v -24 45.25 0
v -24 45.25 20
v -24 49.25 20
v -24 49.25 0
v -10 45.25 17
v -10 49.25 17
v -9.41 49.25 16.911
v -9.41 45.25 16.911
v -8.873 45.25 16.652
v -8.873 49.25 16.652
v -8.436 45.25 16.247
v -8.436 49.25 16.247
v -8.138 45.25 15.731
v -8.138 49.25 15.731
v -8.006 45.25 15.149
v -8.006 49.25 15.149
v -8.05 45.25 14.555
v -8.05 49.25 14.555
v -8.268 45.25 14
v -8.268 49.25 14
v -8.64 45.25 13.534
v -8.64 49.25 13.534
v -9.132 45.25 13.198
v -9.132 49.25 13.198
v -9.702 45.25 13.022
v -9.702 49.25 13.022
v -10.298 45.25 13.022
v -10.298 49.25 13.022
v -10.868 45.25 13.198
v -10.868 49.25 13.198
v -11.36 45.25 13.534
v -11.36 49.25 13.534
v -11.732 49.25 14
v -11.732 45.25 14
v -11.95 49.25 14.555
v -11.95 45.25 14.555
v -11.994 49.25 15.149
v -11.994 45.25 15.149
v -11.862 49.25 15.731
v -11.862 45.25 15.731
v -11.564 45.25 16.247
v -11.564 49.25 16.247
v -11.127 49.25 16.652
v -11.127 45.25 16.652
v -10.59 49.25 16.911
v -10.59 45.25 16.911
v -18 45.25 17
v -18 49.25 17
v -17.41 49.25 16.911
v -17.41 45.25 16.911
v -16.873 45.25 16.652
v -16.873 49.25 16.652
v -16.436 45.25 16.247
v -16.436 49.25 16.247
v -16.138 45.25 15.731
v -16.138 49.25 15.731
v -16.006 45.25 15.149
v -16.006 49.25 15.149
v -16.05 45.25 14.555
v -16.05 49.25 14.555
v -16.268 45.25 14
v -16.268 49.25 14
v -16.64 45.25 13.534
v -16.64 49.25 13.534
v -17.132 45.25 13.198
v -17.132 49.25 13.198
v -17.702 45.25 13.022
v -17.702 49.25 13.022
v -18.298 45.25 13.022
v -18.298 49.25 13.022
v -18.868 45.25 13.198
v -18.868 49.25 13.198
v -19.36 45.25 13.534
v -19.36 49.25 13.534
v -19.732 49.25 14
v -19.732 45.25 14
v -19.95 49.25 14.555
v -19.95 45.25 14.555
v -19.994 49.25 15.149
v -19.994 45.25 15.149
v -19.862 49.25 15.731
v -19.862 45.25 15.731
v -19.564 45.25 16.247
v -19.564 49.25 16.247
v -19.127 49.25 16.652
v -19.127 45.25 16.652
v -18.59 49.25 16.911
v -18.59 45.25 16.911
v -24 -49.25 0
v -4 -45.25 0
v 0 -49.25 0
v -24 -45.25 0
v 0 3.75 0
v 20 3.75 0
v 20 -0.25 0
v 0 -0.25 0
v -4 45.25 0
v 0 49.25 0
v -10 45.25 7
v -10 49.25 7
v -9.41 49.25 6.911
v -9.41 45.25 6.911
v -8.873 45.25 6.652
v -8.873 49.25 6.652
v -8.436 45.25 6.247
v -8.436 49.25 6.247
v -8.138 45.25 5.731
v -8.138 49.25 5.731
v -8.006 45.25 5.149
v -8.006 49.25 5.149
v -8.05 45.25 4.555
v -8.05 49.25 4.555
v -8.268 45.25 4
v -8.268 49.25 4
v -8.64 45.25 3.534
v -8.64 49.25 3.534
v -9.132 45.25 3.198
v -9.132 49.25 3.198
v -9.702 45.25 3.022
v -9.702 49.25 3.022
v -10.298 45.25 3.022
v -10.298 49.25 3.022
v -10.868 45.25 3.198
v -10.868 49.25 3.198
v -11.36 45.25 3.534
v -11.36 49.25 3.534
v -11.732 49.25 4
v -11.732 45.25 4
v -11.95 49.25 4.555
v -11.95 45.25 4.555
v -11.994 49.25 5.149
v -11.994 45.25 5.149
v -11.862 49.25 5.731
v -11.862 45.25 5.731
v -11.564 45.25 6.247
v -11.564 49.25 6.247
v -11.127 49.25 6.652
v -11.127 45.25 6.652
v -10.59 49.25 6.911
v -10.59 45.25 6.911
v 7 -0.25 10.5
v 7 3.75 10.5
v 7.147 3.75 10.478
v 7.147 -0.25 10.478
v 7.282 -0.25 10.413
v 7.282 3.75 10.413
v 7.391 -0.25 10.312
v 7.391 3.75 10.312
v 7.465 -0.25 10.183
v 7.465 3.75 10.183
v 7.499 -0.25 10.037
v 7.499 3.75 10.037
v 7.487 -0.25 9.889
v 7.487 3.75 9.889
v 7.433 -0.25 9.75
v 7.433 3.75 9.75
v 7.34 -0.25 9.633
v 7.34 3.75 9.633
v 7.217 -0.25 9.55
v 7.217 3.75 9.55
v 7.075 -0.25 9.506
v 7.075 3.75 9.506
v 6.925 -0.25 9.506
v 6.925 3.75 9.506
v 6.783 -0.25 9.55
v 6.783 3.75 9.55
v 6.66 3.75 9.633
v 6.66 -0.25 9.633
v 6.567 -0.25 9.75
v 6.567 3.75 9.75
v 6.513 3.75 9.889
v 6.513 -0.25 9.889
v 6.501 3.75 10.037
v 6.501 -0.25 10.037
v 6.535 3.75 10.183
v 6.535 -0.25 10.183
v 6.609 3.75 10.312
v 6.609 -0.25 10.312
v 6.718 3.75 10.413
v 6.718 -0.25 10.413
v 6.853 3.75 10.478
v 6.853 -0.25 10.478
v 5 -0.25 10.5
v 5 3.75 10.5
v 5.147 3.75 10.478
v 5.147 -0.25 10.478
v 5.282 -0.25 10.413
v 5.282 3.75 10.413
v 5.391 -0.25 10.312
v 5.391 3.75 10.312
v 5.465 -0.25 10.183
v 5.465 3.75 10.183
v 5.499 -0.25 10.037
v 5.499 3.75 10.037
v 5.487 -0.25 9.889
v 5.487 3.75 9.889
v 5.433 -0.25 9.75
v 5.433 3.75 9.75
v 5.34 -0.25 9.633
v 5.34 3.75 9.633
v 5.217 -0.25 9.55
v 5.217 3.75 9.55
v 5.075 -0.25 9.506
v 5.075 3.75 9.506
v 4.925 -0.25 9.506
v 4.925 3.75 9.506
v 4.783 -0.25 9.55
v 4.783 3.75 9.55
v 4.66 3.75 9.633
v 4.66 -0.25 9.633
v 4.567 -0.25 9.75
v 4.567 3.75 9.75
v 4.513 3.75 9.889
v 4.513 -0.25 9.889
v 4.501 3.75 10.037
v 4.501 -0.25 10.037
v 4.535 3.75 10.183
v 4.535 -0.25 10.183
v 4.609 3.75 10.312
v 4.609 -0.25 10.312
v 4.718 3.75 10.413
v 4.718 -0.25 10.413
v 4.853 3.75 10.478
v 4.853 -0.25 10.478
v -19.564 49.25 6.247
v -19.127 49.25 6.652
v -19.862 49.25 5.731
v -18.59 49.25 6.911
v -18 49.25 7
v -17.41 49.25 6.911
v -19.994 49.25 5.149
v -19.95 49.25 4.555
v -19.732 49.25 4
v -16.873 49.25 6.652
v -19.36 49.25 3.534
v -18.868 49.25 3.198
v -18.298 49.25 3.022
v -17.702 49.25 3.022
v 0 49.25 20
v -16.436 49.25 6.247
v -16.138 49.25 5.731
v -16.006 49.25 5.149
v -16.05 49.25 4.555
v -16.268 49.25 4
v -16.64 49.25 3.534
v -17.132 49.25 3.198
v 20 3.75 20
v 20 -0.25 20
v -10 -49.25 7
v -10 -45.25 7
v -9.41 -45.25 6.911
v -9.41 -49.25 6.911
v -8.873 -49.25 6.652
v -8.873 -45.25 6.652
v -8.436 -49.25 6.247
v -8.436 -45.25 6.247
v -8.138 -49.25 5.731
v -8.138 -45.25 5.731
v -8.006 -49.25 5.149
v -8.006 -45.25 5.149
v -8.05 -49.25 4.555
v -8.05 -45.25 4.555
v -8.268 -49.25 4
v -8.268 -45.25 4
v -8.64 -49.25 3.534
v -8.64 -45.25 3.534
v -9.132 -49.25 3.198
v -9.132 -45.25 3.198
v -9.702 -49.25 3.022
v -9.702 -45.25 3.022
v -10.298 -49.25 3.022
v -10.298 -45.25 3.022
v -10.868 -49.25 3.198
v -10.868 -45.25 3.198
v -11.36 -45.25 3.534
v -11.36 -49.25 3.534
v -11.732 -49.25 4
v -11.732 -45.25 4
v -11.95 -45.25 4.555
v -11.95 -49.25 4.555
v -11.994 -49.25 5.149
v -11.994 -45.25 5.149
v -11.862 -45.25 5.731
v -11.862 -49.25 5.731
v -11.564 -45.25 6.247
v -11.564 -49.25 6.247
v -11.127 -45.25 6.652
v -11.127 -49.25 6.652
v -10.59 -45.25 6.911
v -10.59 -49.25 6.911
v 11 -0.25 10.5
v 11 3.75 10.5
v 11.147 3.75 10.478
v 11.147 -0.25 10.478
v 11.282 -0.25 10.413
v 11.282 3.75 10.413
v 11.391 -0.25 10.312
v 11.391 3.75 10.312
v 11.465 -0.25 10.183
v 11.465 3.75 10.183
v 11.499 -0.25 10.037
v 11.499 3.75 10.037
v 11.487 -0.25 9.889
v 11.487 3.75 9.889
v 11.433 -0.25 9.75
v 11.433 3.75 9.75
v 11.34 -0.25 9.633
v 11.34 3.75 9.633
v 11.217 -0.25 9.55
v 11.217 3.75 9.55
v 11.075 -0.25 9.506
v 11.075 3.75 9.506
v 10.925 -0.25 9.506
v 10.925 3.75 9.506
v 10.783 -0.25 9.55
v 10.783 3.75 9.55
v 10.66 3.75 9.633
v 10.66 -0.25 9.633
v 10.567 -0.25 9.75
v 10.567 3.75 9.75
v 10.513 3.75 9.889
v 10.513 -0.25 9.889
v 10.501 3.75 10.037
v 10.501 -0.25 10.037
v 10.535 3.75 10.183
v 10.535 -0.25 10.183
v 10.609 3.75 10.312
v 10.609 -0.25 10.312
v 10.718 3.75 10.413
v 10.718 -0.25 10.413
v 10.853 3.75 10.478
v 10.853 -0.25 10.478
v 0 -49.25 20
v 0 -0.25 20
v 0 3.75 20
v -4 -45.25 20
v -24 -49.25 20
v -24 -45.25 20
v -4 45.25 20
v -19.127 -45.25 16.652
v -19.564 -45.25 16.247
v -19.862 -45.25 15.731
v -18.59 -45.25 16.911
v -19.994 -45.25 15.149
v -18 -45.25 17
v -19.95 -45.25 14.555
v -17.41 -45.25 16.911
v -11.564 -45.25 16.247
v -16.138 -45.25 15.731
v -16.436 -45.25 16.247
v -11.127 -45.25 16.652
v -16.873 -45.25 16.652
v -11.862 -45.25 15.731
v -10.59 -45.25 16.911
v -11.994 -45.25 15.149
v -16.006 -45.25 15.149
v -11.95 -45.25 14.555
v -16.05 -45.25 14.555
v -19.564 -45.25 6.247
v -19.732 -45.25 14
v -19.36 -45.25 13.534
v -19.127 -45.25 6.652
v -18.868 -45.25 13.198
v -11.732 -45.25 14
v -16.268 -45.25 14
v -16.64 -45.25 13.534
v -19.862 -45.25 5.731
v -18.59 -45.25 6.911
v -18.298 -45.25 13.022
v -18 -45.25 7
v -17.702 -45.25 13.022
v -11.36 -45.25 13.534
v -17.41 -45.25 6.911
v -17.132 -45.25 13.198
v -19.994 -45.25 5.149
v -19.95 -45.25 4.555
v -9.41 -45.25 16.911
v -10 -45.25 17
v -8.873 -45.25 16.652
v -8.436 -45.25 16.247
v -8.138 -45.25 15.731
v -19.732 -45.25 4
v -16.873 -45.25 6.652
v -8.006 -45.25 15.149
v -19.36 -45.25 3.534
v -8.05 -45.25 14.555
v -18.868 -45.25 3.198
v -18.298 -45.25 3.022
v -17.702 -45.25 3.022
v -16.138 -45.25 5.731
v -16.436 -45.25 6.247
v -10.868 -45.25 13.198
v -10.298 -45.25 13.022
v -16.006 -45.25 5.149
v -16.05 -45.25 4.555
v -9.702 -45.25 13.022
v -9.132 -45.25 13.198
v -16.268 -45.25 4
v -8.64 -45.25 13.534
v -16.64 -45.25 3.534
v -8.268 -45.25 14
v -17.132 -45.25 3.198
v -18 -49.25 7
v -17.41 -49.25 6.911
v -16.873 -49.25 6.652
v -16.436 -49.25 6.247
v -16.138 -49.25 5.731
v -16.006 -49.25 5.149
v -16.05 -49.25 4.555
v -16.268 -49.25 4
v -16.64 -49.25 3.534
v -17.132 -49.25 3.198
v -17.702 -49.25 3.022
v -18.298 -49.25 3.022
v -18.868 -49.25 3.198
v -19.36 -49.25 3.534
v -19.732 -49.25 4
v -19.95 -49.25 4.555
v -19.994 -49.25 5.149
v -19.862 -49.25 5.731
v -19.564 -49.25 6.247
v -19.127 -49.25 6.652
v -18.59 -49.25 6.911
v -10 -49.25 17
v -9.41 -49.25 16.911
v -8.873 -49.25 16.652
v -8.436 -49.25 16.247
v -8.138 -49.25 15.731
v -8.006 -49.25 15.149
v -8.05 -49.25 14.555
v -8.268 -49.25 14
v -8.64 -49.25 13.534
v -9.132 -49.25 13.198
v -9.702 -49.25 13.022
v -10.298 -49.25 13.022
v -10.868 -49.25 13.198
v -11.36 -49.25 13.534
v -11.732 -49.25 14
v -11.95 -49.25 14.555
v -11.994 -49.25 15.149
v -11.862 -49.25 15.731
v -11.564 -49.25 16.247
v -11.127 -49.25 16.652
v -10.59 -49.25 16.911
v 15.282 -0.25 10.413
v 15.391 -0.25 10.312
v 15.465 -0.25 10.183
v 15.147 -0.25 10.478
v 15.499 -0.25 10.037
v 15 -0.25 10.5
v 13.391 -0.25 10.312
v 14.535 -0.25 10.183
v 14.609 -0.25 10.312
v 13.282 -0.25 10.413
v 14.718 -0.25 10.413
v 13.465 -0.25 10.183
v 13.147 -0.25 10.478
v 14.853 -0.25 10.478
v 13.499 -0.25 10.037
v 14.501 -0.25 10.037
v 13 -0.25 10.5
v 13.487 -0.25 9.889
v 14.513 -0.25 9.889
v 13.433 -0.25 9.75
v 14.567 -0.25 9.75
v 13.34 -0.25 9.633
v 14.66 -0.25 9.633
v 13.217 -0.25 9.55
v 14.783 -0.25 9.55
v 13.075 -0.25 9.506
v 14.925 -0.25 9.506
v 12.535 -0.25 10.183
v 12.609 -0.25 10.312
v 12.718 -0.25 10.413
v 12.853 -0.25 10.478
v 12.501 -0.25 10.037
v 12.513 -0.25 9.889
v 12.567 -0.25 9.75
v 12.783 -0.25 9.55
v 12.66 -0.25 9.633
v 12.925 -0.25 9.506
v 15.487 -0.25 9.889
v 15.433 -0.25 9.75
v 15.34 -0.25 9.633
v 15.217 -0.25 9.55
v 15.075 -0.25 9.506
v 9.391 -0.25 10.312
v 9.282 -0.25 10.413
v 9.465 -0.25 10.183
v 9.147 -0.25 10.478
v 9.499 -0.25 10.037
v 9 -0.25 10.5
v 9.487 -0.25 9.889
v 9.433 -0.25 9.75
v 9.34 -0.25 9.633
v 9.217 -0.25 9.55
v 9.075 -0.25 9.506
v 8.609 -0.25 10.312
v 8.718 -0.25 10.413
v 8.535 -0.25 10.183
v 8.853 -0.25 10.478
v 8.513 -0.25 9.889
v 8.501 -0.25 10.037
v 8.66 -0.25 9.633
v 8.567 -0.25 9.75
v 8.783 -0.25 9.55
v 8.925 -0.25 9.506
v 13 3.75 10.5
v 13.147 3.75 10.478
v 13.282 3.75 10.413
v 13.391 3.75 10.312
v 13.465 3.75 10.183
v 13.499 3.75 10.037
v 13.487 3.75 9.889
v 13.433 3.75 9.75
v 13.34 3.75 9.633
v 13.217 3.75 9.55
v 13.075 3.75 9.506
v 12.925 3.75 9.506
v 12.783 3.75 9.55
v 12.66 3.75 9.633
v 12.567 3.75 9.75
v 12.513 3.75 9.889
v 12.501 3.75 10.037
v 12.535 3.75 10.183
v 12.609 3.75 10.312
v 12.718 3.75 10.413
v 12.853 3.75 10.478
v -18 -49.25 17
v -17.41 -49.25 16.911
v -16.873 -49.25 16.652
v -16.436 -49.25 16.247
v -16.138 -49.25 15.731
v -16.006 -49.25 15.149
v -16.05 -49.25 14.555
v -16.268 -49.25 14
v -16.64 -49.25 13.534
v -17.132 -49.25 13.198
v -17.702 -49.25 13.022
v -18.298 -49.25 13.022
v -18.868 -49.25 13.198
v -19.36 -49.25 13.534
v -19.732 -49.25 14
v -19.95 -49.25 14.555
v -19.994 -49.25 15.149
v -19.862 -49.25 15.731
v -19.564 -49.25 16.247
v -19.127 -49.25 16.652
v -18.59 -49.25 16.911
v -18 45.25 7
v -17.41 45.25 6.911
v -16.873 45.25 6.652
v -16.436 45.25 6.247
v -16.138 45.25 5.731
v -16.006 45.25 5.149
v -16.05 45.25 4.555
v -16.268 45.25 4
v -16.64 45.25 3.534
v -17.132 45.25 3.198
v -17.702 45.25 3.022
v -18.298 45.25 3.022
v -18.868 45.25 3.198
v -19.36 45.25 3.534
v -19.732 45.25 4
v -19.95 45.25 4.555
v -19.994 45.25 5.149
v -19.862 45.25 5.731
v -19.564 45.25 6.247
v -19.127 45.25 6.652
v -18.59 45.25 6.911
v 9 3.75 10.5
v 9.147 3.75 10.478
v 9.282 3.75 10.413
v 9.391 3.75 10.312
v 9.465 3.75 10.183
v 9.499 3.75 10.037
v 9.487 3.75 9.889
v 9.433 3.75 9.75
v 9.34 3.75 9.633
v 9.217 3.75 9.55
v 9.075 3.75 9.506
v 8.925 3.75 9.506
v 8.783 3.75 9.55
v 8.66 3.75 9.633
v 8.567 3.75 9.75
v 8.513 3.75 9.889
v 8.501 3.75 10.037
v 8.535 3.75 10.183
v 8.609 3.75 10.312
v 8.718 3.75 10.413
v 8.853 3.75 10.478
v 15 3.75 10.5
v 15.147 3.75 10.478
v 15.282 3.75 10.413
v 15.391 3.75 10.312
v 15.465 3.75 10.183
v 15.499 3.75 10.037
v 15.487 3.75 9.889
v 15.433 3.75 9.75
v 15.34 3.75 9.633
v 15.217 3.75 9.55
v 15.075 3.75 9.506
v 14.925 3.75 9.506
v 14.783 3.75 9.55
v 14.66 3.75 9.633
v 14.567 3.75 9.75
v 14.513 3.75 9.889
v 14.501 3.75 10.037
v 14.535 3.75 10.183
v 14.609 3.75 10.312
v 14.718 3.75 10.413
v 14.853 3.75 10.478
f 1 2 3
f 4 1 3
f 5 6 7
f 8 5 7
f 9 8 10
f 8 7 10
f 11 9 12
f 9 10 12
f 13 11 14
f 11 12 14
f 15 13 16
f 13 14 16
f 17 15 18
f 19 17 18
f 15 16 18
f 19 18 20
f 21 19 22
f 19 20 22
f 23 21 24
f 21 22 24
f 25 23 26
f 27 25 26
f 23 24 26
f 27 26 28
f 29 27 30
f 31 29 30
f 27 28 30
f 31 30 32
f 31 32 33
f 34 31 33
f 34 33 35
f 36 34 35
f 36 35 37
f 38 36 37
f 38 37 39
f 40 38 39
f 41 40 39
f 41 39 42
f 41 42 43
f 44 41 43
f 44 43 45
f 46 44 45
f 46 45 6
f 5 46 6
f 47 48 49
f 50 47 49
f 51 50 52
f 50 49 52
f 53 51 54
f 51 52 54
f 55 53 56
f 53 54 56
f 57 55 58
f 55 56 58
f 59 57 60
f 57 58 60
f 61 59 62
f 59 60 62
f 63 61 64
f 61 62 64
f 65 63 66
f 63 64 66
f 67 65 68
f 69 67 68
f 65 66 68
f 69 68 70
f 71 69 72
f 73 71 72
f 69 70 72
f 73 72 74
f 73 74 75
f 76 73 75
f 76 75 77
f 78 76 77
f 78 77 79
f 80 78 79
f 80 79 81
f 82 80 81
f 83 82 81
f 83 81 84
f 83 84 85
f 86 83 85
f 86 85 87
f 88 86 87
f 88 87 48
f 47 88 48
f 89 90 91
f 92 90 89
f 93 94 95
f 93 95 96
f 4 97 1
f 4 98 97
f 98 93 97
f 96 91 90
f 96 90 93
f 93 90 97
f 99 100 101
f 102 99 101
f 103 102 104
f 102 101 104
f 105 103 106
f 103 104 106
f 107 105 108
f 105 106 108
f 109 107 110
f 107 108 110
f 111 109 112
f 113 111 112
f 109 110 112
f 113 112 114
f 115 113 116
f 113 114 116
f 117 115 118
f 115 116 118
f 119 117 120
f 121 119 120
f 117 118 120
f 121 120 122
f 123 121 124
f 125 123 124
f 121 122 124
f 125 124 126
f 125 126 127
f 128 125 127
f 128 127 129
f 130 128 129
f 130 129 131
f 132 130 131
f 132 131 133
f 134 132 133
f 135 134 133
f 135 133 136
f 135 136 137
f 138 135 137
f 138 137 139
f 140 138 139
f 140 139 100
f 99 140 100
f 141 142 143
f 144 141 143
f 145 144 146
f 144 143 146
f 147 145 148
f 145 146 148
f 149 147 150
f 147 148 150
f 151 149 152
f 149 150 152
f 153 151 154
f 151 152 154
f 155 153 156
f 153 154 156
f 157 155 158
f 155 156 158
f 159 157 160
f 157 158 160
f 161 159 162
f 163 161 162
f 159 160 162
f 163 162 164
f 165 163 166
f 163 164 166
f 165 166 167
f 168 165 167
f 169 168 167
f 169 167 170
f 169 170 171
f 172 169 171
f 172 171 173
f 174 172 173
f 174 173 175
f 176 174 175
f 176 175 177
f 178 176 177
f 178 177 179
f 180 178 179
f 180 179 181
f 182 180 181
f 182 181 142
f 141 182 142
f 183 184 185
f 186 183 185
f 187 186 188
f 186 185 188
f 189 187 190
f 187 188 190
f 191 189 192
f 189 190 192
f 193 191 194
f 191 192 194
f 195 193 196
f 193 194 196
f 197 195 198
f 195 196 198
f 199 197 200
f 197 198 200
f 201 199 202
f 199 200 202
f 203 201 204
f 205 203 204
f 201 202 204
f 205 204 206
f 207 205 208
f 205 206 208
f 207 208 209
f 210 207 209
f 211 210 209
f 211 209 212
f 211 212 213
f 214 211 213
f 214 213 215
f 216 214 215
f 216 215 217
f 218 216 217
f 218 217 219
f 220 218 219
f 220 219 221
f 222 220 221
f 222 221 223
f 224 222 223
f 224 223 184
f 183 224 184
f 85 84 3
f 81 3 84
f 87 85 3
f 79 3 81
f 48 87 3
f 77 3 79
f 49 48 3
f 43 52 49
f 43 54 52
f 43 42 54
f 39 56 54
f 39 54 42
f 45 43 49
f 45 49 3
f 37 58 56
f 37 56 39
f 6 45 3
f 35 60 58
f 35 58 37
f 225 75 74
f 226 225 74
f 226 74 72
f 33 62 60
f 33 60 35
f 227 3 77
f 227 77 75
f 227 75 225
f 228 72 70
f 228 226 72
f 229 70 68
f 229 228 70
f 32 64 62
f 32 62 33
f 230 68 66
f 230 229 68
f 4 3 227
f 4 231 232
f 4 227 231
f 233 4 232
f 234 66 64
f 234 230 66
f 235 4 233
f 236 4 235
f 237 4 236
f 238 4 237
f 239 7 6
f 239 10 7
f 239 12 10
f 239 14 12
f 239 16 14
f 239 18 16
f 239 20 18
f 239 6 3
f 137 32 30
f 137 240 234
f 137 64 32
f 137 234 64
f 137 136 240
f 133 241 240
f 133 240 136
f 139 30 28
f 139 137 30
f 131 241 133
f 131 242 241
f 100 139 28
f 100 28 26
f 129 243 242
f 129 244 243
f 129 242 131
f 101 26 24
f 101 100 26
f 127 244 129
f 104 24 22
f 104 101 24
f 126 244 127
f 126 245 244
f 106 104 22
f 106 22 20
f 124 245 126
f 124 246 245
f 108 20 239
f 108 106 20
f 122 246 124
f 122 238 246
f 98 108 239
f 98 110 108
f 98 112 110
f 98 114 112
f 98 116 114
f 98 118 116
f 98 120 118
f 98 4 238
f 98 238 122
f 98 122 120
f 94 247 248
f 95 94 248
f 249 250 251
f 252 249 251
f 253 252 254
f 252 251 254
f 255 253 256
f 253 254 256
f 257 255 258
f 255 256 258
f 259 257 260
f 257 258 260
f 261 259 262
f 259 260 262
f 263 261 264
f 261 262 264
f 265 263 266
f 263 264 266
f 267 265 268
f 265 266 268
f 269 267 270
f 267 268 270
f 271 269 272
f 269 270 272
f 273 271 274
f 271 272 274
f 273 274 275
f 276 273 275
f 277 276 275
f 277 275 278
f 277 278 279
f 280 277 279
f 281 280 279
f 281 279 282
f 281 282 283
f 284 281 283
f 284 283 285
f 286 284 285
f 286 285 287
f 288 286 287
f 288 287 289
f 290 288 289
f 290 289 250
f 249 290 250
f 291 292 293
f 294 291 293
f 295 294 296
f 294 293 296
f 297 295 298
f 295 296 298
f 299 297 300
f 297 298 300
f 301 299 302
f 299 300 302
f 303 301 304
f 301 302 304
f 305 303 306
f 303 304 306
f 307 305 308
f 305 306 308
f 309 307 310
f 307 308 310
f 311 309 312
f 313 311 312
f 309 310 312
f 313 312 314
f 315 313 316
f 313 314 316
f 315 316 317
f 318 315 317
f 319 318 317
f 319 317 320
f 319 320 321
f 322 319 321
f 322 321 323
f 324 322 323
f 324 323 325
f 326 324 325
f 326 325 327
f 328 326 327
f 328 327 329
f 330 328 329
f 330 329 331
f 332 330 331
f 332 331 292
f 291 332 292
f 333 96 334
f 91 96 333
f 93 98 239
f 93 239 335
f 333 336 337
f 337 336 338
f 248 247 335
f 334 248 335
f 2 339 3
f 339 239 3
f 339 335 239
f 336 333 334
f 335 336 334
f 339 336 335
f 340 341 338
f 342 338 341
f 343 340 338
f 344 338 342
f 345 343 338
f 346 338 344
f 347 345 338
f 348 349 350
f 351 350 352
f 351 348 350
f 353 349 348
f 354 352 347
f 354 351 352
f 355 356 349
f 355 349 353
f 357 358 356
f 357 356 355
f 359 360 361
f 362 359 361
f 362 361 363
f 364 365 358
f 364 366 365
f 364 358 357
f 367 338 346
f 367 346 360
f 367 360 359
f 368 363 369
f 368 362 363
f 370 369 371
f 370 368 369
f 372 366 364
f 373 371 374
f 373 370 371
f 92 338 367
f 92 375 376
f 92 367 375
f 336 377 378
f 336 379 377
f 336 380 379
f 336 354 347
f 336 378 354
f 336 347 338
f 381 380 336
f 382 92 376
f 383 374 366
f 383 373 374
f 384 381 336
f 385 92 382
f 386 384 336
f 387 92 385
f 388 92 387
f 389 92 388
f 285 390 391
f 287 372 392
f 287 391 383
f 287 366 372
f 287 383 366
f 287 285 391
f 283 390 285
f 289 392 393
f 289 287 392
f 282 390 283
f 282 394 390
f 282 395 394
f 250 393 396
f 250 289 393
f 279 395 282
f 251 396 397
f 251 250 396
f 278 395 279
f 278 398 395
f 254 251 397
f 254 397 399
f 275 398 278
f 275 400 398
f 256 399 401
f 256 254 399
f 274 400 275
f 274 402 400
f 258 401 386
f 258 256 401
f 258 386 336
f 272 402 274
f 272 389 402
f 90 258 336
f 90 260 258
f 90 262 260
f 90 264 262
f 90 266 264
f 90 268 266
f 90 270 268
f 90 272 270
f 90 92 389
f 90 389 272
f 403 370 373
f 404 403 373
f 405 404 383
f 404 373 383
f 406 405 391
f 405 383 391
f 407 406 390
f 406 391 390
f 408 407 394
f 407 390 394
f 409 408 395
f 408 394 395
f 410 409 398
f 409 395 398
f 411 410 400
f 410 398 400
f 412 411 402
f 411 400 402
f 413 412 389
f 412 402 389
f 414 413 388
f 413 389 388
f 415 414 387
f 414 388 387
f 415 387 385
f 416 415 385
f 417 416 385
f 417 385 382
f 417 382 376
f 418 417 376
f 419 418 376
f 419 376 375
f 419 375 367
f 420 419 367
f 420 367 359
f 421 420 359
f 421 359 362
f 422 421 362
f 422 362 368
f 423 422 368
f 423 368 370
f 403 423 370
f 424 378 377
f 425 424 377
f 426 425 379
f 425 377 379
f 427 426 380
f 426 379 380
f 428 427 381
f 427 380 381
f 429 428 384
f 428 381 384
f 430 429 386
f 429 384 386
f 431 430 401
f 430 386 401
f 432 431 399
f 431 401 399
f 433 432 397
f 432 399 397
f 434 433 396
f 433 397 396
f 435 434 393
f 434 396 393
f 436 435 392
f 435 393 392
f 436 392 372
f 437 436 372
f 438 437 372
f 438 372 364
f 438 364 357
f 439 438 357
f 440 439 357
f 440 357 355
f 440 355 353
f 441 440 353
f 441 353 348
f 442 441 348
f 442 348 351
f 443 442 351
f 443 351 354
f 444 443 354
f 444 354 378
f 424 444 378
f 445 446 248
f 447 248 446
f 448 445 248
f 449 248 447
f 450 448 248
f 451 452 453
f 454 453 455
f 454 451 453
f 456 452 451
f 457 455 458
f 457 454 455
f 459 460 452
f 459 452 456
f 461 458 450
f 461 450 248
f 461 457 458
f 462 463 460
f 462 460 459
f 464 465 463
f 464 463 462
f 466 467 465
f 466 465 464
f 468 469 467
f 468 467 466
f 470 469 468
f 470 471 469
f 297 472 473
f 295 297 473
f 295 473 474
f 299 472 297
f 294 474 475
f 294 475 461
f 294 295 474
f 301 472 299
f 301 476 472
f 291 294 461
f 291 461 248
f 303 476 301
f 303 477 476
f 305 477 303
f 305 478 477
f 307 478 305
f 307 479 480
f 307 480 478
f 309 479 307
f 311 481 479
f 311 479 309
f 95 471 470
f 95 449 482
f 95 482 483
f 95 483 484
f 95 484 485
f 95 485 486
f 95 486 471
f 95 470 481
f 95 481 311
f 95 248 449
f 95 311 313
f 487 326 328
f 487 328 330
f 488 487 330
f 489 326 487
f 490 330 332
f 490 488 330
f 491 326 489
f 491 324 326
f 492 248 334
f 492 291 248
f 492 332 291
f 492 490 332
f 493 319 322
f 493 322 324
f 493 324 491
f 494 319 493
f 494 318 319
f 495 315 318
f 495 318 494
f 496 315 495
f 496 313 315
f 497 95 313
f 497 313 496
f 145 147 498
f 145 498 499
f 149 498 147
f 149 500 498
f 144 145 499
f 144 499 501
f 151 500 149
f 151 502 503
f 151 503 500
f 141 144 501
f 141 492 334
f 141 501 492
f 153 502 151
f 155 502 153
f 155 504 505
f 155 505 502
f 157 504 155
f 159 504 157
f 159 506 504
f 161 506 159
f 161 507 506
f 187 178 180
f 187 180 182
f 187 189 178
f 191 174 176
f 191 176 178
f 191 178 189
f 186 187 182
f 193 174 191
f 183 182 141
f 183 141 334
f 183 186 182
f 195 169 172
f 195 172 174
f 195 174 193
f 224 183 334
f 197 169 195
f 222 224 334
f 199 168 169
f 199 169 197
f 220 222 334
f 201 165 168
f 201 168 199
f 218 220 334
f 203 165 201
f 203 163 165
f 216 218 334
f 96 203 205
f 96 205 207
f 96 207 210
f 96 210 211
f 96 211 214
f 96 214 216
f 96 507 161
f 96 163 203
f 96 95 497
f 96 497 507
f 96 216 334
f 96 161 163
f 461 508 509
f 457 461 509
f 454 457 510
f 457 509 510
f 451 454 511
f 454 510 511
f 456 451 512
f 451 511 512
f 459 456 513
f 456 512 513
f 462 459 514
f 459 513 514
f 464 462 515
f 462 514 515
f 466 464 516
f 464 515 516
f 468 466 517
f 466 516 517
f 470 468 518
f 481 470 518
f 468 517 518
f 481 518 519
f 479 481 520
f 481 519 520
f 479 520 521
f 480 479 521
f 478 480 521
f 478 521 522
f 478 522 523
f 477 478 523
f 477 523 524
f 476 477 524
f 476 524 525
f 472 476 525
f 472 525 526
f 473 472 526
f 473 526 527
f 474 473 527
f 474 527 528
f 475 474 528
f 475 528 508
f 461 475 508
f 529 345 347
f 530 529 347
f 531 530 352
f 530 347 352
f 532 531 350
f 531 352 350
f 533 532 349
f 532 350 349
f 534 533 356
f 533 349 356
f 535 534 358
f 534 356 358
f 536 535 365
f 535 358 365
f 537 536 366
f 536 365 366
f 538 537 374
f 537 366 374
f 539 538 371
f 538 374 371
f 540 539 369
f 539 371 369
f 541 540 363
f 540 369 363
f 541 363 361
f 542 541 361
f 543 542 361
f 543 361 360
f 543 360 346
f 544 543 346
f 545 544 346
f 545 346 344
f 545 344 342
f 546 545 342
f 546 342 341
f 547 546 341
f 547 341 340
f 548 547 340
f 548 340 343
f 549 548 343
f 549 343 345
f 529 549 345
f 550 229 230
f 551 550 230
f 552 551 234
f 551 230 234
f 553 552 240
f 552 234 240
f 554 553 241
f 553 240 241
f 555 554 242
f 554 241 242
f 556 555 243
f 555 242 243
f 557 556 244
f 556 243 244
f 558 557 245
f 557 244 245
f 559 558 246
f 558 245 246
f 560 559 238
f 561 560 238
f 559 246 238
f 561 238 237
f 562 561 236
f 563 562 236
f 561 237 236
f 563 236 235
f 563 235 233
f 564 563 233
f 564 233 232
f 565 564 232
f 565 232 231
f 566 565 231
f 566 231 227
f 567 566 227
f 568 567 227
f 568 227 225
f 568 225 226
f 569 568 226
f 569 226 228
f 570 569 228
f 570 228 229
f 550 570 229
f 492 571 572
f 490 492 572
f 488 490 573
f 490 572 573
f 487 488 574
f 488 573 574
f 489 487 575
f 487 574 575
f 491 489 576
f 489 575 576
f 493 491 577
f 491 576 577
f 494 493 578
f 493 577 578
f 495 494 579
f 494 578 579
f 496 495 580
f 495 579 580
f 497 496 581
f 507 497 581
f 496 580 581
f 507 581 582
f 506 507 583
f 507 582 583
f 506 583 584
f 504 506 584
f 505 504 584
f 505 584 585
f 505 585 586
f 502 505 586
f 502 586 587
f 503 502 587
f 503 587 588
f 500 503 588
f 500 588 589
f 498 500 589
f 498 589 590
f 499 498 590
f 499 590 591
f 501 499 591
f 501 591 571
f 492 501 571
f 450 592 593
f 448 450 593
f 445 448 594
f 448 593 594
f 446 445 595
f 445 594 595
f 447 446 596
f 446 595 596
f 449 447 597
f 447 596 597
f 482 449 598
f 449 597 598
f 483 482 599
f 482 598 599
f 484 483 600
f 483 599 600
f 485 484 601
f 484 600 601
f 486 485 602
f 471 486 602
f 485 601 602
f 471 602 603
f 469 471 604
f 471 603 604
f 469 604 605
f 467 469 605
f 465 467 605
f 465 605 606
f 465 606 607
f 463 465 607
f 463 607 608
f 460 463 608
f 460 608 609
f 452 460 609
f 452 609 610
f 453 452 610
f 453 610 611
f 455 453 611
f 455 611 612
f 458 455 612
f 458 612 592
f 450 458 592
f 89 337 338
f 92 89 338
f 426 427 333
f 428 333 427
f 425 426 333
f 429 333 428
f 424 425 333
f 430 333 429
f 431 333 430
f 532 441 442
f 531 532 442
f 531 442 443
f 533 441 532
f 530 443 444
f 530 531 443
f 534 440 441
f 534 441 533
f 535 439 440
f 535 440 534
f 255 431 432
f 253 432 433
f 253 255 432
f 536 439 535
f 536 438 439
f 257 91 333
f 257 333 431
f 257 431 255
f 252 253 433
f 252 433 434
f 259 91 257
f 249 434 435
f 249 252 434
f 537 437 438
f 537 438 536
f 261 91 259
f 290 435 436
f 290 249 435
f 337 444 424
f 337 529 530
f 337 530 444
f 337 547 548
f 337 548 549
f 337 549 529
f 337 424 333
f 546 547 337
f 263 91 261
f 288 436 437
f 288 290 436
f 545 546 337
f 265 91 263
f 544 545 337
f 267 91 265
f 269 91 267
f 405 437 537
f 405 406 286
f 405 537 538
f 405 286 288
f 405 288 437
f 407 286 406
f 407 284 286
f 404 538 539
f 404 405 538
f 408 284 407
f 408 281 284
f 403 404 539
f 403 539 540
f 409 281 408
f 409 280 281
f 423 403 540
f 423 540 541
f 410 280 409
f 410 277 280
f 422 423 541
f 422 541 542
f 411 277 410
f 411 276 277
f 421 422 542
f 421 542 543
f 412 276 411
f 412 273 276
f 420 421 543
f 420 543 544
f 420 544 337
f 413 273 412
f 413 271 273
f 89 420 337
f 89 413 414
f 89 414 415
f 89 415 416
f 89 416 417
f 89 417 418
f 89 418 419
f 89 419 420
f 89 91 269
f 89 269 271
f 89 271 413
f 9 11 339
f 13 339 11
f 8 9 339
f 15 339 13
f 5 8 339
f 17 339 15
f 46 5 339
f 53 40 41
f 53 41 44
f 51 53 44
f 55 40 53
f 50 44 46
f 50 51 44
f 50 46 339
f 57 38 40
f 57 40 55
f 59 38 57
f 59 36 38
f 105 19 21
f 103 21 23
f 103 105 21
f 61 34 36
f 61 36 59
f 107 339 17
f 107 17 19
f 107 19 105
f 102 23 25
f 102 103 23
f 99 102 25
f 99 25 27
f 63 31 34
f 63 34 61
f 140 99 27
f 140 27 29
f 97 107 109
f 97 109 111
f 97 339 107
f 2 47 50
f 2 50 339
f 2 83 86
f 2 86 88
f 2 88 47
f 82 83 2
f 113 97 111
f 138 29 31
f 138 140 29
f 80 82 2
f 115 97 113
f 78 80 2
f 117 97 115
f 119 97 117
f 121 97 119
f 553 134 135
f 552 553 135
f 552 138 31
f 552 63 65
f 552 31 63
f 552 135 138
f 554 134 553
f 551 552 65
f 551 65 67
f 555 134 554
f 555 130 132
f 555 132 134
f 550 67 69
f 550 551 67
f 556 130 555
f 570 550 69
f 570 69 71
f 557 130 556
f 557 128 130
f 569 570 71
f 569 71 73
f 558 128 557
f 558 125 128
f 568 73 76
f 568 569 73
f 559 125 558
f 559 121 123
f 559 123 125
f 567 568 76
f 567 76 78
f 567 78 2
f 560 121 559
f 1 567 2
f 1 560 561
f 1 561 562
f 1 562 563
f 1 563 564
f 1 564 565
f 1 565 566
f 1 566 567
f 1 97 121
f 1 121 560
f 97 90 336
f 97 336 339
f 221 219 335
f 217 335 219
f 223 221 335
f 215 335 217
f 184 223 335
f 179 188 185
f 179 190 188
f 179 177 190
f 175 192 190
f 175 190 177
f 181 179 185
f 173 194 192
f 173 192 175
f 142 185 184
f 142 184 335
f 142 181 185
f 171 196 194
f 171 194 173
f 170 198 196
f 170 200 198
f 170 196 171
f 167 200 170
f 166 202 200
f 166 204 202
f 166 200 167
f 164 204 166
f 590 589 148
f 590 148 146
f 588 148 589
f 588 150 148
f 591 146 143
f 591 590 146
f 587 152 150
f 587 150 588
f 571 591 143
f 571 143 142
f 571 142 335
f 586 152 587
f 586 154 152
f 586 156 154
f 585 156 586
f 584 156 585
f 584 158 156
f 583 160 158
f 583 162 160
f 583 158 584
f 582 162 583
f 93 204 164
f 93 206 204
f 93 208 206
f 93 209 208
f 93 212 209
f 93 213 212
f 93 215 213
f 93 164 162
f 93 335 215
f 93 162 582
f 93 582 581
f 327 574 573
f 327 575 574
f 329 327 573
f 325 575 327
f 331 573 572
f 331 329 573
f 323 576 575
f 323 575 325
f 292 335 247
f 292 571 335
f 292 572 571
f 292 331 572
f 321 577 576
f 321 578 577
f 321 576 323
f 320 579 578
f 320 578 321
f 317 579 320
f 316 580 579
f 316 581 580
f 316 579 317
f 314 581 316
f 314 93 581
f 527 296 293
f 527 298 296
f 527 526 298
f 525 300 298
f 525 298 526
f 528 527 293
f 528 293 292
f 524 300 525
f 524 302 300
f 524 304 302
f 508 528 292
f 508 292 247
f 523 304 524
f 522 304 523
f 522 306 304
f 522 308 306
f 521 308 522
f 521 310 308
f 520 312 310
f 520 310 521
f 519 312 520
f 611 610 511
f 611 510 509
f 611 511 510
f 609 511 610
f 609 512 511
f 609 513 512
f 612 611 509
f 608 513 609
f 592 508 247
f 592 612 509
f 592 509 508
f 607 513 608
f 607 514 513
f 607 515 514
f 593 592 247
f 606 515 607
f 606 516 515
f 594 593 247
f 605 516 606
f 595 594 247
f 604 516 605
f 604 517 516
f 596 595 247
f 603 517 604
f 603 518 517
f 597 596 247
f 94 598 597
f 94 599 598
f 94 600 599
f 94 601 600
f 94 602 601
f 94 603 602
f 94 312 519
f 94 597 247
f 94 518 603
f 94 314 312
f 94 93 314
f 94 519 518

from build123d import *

# Parameters (mm, degrees)
BOSS_EXTRUDE1_DEPTH = 20
SKETCH2_R           = 2
CUT_EXTRUDE1_DEPTH  = 104.335618254
SKETCH4_R           = 0.5
CUT_EXTRUDE2_DEPTH  = 20


with BuildPart() as part:
    # Sketch1 → Boss-Extrude1 (new body)
    with BuildSketch(Plane.XY):
        Polygon((-24, 49.25), (0, 49.25), (0, 3.75), (20, 3.75), (20, -0.25), (0, -0.25), (0, -49.25), (-24, -49.25), (-24, -45.25), (-4, -45.25), (-4, 45.25), (-24, 45.25), align=None)
    extrude(amount=BOSS_EXTRUDE1_DEPTH)

    # Sketch2 → Cut-Extrude1 (cut, through all)
    with BuildSketch(Plane(origin=(0, 49.25, 0), x_dir=(1, 0, 0), z_dir=(0, 1, 0))):
        with Locations(Location((-18, -5, 0), (0, 0, 270))):
            Circle(SKETCH2_R)
        with Locations(Location((-10, -5, 0), (0, 0, 270))):
            Circle(SKETCH2_R)
        with Locations(Location((-10, -15, 0), (0, 0, 270))):
            Circle(SKETCH2_R)
        with Locations(Location((-18, -15, 0), (0, 0, 270))):
            Circle(SKETCH2_R)
    extrude(amount=-CUT_EXTRUDE1_DEPTH, mode=Mode.SUBTRACT)

    # Sketch4 → Cut-Extrude2 (cut)
    with BuildSketch(Plane(origin=(0, 3.75, 0), x_dir=(1, 0, 0), z_dir=(0, 1, 0))):
        with Locations(Location((15, -10, 0), (0, 0, 270))):
            Circle(SKETCH4_R)
        with Locations(Location((13, -10, 0), (0, 0, 270))):
            Circle(SKETCH4_R)
        with Locations(Location((11, -10, 0), (0, 0, 270))):
            Circle(SKETCH4_R)
        with Locations(Location((9, -10, 0), (0, 0, 270))):
            Circle(SKETCH4_R)
        with Locations(Location((7, -10, 0), (0, 0, 270))):
            Circle(SKETCH4_R)
        with Locations(Location((5, -10, 0), (0, 0, 270))):
            Circle(SKETCH4_R)
    extrude(amount=-CUT_EXTRUDE2_DEPTH, mode=Mode.SUBTRACT)


solid = part.part
